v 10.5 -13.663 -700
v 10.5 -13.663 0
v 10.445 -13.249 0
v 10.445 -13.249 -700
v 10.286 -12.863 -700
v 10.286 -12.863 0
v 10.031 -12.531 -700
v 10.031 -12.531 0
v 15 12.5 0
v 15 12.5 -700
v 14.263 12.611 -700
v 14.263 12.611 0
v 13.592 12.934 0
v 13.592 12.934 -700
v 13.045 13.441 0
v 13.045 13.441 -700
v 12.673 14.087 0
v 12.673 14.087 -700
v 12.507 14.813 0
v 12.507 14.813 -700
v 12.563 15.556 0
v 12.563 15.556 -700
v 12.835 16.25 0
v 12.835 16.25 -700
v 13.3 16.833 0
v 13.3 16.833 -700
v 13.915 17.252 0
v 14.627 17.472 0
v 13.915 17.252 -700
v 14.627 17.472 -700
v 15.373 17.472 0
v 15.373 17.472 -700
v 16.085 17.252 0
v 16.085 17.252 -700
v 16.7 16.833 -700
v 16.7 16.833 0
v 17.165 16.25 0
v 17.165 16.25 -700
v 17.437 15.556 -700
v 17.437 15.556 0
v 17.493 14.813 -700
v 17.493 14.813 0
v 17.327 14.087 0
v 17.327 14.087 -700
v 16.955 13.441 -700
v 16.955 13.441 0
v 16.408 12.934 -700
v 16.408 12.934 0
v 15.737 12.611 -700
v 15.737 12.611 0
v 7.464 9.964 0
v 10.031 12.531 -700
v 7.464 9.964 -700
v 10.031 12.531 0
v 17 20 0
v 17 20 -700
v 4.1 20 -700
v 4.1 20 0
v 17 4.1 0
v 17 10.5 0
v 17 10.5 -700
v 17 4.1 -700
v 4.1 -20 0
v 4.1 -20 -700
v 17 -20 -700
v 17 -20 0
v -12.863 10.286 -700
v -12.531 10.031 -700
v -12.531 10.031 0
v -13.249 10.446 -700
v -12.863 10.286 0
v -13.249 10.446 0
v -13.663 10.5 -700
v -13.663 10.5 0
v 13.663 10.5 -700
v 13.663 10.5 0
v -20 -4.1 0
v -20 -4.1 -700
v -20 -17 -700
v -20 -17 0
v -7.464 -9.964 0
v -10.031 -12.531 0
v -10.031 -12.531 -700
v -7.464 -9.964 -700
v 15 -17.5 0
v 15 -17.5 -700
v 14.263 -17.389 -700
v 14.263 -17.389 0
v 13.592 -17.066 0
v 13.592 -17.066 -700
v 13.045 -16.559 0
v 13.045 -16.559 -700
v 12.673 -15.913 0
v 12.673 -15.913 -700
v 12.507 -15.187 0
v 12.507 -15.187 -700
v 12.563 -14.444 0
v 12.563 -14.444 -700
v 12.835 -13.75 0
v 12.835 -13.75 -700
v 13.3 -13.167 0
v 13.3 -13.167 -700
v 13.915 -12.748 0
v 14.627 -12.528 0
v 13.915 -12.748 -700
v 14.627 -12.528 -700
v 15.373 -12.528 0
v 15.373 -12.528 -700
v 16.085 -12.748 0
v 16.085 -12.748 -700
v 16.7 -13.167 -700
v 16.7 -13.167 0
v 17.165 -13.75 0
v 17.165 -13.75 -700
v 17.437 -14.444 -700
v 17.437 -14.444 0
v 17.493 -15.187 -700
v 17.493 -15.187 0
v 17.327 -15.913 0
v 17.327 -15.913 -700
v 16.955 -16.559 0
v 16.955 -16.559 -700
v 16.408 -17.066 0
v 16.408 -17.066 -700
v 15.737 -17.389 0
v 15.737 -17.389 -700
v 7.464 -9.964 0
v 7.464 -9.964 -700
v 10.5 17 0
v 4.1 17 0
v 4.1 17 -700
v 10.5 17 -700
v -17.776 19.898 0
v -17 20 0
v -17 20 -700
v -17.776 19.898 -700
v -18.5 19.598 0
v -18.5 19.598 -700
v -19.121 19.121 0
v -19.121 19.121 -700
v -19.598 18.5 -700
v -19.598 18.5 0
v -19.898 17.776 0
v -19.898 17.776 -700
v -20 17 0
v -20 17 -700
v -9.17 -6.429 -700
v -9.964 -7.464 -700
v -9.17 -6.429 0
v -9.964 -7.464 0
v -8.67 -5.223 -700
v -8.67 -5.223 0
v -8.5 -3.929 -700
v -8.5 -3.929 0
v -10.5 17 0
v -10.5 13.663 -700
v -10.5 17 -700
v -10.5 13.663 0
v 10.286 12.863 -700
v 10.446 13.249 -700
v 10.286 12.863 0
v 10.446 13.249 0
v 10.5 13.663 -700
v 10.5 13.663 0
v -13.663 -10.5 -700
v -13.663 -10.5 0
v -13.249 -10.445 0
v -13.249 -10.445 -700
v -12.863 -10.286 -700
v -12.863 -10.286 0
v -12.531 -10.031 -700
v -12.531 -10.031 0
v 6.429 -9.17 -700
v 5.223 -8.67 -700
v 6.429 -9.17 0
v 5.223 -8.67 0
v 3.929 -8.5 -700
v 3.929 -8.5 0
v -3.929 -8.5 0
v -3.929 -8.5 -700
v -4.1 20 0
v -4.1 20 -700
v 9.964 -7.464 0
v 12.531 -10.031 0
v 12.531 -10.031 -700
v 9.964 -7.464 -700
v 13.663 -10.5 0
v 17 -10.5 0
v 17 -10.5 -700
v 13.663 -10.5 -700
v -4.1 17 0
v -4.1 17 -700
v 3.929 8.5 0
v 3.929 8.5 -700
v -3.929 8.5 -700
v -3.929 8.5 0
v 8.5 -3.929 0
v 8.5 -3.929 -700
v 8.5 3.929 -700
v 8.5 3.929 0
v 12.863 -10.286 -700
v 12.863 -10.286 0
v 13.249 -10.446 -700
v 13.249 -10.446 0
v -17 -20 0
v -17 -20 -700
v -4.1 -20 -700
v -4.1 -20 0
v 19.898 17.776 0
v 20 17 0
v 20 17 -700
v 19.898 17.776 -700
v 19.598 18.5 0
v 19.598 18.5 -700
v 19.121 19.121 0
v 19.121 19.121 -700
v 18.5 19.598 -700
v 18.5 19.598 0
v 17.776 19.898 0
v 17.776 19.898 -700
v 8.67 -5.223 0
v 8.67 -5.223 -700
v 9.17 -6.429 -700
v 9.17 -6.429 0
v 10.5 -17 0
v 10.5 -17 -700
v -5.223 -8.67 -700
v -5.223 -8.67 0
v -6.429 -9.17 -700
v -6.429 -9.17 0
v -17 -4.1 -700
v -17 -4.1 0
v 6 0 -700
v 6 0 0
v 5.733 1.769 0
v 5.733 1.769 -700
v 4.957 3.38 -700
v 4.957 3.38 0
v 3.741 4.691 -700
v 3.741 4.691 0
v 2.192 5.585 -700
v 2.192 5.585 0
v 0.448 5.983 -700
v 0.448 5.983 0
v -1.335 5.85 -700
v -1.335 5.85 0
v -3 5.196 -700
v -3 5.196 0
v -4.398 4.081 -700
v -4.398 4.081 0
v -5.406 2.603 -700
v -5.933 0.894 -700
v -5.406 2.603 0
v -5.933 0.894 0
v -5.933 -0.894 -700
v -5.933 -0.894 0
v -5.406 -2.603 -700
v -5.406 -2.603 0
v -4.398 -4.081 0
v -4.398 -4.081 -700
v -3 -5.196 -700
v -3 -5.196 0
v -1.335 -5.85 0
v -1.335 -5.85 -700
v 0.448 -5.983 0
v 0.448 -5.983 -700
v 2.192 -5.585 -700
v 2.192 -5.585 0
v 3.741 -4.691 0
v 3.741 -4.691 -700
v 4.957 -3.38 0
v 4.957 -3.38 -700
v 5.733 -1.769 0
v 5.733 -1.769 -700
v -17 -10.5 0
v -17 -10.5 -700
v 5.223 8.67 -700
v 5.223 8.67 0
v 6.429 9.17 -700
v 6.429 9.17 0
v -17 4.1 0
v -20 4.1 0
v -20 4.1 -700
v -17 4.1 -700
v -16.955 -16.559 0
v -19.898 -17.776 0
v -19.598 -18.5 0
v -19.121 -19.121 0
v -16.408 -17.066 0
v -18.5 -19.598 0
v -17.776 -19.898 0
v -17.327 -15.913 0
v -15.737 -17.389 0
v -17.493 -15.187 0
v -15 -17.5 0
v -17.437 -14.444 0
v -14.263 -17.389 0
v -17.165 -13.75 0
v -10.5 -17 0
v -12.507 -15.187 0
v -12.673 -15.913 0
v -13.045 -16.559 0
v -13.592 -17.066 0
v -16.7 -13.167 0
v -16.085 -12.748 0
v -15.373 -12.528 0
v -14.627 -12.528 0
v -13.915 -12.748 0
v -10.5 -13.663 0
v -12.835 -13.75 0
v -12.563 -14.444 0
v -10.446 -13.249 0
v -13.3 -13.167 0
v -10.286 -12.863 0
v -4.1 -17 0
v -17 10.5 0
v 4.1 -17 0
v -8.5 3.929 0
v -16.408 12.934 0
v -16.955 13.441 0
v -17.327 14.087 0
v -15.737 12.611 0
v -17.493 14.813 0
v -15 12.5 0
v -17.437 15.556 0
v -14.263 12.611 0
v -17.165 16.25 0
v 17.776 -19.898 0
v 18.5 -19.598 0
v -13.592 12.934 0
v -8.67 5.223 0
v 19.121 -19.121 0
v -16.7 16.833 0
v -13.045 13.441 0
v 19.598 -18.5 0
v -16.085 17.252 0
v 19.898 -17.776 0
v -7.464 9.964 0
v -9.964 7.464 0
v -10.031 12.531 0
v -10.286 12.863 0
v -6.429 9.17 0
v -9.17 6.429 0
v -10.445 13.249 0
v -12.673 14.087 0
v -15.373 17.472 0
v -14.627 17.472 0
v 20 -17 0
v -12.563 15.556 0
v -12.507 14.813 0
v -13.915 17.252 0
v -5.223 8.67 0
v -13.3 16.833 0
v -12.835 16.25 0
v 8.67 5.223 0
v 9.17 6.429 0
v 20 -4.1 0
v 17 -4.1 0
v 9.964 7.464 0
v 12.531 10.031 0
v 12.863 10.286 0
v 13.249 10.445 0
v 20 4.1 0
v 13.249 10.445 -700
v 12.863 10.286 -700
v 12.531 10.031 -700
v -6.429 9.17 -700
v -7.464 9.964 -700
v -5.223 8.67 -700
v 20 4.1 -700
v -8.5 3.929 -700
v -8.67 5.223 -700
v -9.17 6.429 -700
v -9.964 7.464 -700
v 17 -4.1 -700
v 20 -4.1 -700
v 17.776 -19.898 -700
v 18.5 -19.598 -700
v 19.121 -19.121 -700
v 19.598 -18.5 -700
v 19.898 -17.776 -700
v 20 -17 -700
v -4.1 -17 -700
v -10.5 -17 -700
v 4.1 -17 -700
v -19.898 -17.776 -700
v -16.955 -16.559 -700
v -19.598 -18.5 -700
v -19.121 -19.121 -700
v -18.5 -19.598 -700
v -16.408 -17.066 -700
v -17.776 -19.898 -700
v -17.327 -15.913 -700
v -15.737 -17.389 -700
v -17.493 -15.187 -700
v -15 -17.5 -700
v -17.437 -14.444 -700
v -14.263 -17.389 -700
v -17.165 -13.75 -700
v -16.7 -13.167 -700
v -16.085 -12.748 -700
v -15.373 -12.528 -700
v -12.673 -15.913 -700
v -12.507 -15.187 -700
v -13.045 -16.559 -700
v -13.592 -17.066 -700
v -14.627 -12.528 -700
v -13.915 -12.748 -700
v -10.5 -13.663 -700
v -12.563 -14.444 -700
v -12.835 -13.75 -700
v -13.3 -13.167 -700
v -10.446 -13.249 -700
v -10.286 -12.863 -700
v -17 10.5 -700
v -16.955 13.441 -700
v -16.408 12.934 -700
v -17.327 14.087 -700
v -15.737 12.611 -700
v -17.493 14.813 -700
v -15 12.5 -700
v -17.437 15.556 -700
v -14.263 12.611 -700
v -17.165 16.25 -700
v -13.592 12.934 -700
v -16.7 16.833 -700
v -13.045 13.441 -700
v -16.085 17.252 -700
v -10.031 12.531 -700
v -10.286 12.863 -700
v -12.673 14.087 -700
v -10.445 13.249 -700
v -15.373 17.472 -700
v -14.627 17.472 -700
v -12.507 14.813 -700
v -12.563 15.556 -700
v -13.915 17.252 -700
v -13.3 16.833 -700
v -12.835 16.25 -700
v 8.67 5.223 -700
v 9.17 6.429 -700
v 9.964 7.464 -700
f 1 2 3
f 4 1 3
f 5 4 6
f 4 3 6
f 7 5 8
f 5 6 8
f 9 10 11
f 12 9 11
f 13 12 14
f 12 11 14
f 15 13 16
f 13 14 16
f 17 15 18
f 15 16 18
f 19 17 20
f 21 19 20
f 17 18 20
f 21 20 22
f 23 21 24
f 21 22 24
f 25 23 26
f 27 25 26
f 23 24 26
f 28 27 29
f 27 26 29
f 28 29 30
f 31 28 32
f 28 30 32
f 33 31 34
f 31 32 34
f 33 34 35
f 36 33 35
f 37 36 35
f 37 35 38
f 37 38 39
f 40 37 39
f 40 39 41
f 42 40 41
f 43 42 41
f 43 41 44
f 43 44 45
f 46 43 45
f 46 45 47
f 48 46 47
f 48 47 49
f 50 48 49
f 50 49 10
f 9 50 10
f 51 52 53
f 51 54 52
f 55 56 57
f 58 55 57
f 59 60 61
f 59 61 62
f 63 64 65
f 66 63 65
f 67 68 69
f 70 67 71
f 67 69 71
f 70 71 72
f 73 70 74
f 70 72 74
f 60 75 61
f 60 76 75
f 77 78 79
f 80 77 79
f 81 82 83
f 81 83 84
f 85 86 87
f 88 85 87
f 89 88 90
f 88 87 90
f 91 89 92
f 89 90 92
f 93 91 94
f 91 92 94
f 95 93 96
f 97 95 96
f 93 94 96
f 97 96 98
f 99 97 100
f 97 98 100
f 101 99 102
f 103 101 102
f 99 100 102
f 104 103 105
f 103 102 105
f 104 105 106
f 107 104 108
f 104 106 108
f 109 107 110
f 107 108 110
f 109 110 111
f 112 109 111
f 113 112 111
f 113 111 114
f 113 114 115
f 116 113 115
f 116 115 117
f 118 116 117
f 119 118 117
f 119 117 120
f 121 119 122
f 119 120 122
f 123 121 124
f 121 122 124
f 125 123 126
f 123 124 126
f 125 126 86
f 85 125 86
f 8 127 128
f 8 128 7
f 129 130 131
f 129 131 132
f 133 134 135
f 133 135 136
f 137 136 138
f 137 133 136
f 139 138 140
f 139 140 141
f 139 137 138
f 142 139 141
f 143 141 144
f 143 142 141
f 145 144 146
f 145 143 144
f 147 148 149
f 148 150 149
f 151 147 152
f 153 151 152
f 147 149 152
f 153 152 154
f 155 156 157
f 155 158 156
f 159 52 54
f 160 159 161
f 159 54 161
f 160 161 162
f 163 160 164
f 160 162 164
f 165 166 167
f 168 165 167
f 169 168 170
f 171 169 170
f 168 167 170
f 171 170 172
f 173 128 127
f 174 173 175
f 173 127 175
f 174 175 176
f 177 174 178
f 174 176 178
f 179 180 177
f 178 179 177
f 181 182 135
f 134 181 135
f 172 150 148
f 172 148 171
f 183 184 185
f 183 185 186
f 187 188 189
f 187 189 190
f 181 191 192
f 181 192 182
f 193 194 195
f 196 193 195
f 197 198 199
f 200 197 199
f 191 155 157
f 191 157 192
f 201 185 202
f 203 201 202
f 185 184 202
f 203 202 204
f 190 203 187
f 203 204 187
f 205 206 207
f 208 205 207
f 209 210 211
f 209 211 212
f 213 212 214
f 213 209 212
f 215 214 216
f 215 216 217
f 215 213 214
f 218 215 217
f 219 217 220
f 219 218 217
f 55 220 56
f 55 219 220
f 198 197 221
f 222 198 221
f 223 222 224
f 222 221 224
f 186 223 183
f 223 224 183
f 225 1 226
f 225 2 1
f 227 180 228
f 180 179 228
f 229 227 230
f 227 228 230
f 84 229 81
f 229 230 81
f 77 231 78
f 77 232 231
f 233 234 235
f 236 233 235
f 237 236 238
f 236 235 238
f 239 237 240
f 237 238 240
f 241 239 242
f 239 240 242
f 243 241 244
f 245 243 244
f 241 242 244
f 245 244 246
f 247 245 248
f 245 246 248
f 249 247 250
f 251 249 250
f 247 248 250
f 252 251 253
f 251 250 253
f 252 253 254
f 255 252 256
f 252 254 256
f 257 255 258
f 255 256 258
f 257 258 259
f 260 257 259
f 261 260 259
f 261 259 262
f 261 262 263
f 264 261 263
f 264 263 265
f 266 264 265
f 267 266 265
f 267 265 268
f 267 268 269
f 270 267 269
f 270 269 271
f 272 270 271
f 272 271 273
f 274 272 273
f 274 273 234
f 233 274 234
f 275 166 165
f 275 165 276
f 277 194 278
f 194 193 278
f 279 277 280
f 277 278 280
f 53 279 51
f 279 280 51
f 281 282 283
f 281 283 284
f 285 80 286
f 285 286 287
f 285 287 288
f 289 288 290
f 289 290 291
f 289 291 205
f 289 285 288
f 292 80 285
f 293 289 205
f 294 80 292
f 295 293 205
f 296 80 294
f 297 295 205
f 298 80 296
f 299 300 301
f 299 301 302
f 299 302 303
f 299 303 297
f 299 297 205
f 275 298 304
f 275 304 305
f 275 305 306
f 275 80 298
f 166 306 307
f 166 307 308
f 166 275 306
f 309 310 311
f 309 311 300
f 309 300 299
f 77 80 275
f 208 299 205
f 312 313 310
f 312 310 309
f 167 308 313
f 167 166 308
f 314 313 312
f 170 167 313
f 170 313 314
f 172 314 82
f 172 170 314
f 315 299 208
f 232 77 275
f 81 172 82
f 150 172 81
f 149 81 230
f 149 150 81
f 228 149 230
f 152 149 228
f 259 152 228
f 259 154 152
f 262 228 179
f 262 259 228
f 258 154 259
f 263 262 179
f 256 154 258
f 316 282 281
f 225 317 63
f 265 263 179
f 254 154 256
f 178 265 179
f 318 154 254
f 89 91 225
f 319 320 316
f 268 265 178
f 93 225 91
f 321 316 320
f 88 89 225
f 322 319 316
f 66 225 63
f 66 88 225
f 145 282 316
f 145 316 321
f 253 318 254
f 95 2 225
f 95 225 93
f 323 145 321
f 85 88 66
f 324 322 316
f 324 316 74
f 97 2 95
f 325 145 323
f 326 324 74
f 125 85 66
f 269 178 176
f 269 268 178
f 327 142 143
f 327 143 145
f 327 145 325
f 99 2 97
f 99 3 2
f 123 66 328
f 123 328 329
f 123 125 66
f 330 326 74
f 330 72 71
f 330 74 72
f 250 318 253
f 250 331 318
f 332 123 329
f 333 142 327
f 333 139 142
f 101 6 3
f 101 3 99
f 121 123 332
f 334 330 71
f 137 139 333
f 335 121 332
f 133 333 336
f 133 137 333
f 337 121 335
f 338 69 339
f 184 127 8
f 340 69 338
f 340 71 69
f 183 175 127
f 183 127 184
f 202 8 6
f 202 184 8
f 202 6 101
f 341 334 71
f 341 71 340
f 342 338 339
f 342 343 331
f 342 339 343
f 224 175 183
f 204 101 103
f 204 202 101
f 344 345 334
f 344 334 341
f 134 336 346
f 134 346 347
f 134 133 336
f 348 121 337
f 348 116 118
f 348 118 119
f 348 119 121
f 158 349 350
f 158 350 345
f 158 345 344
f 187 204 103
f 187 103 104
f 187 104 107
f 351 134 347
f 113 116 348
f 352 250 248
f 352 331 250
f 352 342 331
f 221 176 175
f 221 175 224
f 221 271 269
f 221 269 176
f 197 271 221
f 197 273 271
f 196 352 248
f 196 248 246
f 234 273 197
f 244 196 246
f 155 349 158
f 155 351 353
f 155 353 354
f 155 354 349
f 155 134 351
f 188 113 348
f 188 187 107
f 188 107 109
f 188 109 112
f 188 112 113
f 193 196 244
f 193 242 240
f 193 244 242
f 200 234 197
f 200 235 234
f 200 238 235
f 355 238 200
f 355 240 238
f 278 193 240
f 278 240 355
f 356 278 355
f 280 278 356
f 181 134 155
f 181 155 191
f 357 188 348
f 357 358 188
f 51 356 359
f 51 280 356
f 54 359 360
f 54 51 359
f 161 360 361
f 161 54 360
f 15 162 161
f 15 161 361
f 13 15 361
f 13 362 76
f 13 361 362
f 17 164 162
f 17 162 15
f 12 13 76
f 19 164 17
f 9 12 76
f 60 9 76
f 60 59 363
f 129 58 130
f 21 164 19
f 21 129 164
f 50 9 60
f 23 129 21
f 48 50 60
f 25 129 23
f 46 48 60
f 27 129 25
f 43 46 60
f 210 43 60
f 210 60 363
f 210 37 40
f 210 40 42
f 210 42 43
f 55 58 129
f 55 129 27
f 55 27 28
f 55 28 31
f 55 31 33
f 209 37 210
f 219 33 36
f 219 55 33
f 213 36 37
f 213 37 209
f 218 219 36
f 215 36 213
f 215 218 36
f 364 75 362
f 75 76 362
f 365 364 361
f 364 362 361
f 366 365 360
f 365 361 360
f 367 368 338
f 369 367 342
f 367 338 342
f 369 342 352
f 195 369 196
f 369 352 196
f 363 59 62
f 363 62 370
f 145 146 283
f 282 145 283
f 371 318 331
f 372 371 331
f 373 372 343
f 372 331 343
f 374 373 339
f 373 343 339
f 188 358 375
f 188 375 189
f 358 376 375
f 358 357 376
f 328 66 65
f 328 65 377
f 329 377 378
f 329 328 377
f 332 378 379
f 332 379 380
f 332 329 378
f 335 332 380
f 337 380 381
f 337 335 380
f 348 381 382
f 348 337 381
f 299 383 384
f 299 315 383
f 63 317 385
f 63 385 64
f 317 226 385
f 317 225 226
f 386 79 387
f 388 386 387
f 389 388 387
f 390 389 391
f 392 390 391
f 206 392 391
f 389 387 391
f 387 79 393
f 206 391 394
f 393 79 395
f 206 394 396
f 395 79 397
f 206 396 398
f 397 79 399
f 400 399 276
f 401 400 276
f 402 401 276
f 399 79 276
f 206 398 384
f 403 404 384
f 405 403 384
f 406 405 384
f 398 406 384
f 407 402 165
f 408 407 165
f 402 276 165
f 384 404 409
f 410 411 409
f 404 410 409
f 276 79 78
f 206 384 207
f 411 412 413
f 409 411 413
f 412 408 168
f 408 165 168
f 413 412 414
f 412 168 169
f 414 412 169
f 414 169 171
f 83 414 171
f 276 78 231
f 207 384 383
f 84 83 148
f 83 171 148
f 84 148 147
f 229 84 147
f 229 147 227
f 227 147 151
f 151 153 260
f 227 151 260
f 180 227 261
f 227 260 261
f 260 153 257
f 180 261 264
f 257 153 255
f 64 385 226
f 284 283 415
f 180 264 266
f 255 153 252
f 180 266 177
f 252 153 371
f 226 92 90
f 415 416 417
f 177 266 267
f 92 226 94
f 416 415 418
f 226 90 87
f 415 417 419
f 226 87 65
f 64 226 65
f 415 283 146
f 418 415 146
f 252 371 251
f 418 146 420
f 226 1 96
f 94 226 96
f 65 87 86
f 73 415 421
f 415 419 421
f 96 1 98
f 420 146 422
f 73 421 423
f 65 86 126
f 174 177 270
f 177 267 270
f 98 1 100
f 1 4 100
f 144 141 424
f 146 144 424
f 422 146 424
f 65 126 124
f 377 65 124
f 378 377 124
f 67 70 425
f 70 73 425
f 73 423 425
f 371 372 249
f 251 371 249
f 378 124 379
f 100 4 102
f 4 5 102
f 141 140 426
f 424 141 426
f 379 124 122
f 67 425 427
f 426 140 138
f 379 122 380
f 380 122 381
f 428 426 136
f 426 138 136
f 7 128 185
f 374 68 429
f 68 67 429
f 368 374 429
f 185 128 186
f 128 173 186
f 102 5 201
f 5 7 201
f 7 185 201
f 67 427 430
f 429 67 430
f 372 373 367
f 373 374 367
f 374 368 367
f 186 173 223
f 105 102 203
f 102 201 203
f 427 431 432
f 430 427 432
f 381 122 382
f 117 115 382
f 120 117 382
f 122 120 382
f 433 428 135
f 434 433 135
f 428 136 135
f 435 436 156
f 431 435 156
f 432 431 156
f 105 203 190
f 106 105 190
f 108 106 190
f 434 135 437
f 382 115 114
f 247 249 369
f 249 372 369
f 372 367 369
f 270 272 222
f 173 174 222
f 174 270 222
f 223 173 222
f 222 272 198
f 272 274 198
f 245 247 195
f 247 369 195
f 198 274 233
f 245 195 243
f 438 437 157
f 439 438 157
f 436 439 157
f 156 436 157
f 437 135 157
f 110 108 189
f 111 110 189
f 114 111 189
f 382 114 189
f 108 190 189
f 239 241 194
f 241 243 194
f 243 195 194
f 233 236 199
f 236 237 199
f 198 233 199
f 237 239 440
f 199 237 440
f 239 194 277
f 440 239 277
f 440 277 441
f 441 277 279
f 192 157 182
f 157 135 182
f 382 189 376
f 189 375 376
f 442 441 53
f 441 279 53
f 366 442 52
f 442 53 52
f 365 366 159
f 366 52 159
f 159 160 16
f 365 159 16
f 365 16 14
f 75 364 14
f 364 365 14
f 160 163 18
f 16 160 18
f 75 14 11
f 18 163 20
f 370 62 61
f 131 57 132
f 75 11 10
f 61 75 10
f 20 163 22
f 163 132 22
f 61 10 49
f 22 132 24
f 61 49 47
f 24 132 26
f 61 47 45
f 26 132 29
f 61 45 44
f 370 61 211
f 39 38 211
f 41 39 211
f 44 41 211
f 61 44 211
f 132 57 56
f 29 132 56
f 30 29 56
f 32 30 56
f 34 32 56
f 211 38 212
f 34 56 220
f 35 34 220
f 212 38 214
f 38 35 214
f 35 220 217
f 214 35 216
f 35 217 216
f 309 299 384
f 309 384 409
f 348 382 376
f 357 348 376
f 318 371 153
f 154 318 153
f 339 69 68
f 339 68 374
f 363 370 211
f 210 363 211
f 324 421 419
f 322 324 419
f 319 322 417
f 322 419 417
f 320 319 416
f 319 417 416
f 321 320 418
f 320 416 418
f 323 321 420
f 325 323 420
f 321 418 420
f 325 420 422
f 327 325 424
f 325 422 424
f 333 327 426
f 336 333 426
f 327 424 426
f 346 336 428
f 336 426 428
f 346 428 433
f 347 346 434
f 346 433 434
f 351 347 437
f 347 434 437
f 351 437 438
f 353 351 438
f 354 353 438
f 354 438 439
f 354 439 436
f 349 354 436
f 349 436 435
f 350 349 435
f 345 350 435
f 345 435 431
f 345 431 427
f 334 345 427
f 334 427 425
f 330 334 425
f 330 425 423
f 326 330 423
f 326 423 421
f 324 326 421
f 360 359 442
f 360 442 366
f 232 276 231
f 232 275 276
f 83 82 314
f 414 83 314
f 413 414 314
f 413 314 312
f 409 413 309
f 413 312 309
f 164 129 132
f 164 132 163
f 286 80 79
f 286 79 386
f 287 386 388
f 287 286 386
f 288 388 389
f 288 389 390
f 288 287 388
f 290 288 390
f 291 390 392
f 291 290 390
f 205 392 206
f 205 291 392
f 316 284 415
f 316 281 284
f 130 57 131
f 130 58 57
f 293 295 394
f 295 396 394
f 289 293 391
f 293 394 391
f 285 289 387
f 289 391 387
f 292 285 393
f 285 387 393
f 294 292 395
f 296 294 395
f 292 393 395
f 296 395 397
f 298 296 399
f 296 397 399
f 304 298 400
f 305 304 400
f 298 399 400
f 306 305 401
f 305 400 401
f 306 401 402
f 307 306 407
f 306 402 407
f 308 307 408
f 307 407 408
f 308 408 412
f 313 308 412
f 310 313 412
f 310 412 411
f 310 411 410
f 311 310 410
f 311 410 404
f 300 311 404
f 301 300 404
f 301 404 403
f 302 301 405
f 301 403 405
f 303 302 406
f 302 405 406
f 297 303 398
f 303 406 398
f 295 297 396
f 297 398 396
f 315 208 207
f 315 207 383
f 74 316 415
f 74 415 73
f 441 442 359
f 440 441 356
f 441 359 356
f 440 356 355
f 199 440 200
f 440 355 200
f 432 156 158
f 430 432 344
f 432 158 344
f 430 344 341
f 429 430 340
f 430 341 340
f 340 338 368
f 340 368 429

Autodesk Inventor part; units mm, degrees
sketch "Skizze_1" plane through (0, 0, 0) normal (0, 0, 1) x (1, 0, 0)
  arc A0 (-20, -17) -> (-17, -20) centre (-17, -17) ccw
  line L0 (-17, -20) -> (-4.1, -20)
  line L1 (-4.1, -20) -> (-4.1, -17)
  line L2 (-4.1, -17) -> (-10.5, -17)
  line L3 (-10.5, -17) -> (-10.5, -13.6627)
  arc A1 (-10.0314, -12.5314) -> (-10.5, -13.6627) centre (-8.9002, -13.6627) ccw
  line L4 (-10.0314, -12.5314) -> (-7.4645, -9.9645)
  arc A2 (-3.9289, -8.5) -> (-7.4645, -9.9645) centre (-3.9289, -13.5) ccw
  line L5 (-3.9289, -8.5) -> (3.9289, -8.5)
  arc A3 (7.4645, -9.9645) -> (3.9289, -8.5) centre (3.9289, -13.5) ccw
  line L6 (7.4645, -9.9645) -> (10.0314, -12.5314)
  arc A4 (10.5, -13.6627) -> (10.0314, -12.5314) centre (8.9002, -13.6627) ccw
  line L7 (10.5, -13.6627) -> (10.5, -17)
  line L8 (10.5, -17) -> (4.1, -17)
  line L9 (4.1, -17) -> (4.1, -20)
  line L10 (4.1, -20) -> (17, -20)
  arc A5 (17, -20) -> (20, -17) centre (17, -17) ccw
  line L11 (20, -17) -> (20, -4.1)
  line L12 (20, -4.1) -> (17, -4.1)
  line L13 (17, -4.1) -> (17, -10.5)
  line L14 (17, -10.5) -> (13.6627, -10.5)
  arc A6 (12.5314, -10.0314) -> (13.6627, -10.5) centre (13.6627, -8.9002) ccw
  line L15 (12.5314, -10.0314) -> (9.9645, -7.4645)
  arc A7 (8.5, -3.9289) -> (9.9645, -7.4645) centre (13.5, -3.9289) ccw
  line L16 (8.5, -3.9289) -> (8.5, 3.9289)
  arc A8 (9.9645, 7.4645) -> (8.5, 3.9289) centre (13.5, 3.9289) ccw
  line L17 (9.9645, 7.4645) -> (12.5314, 10.0314)
  arc A9 (13.6627, 10.5) -> (12.5314, 10.0314) centre (13.6627, 8.9002) ccw
  line L18 (13.6627, 10.5) -> (17, 10.5)
  line L19 (17, 10.5) -> (17, 4.1)
  line L20 (17, 4.1) -> (20, 4.1)
  line L21 (20, 4.1) -> (20, 17)
  arc A10 (20, 17) -> (17, 20) centre (17, 17) ccw
  line L22 (17, 20) -> (4.1, 20)
  line L23 (4.1, 20) -> (4.1, 17)
  line L24 (4.1, 17) -> (10.5, 17)
  line L25 (10.5, 17) -> (10.5, 13.6627)
  arc A11 (10.0314, 12.5314) -> (10.5, 13.6627) centre (8.9002, 13.6627) ccw
  line L26 (10.0314, 12.5314) -> (7.4645, 9.9645)
  arc A12 (3.9289, 8.5) -> (7.4645, 9.9645) centre (3.9289, 13.5) ccw
  line L27 (3.9289, 8.5) -> (-3.9289, 8.5)
  arc A13 (-7.4645, 9.9645) -> (-3.9289, 8.5) centre (-3.9289, 13.5) ccw
  line L28 (-7.4645, 9.9645) -> (-10.0314, 12.5314)
  arc A14 (-10.5, 13.6627) -> (-10.0314, 12.5314) centre (-8.9002, 13.6627) ccw
  line L29 (-10.5, 13.6627) -> (-10.5, 17)
  line L30 (-10.5, 17) -> (-4.1, 17)
  line L31 (-4.1, 17) -> (-4.1, 20)
  line L32 (-4.1, 20) -> (-17, 20)
  arc A15 (-17, 20) -> (-20, 17) centre (-17, 17) ccw
  line L33 (-20, 17) -> (-20, 4.1)
  line L34 (-20, 4.1) -> (-17, 4.1)
  line L35 (-17, 4.1) -> (-17, 10.5)
  line L36 (-17, 10.5) -> (-13.6627, 10.5)
  arc A16 (-12.5314, 10.0314) -> (-13.6627, 10.5) centre (-13.6627, 8.9002) ccw
  line L37 (-12.5314, 10.0314) -> (-9.9645, 7.4645)
  arc A17 (-8.5, 3.9289) -> (-9.9645, 7.4645) centre (-13.5, 3.9289) ccw
  line L38 (-8.5, 3.9289) -> (-8.5, -3.9289)
  arc A18 (-9.9645, -7.4645) -> (-8.5, -3.9289) centre (-13.5, -3.9289) ccw
  line L39 (-9.9645, -7.4645) -> (-12.5314, -10.0314)
  arc A19 (-13.6627, -10.5) -> (-12.5314, -10.0314) centre (-13.6627, -8.9002) ccw
  line L40 (-13.6627, -10.5) -> (-17, -10.5)
  line L41 (-17, -10.5) -> (-17, -4.1)
  line L42 (-17, -4.1) -> (-20, -4.1)
  line L43 (-20, -4.1) -> (-20, -17)
  circle A20 centre (0, 0) radius 6
extrude "Extrusion1" add sketch "Skizze_1" against normal blind 700
sketch "Sketch2" plane through (0, 0, 0) normal (0, 0, 1) x (1, 0, 0)
  point P0 (-15, -15)
hole "Drilling 1" at (-15, -15, 0) direction (0, 0, -1) diameter 5 depth 6000
sketch "Sketch3" plane through (0, 0, 0) normal (0, 0, 1) x (1, 0, 0)
  point P0 (15, -15)
hole "Drilling 2" at (15, -15, 0) direction (0, 0, -1) diameter 5 depth 6000
sketch "Sketch4" plane through (0, 0, 0) normal (0, 0, 1) x (1, 0, 0)
  point P0 (15, 15)
hole "Drilling 3" at (15, 15, 0) direction (0, 0, -1) diameter 5 depth 6000
sketch "Sketch5" plane through (0, 0, 0) normal (0, 0, 1) x (1, 0, 0)
  point P0 (-15, 15)
hole "Drilling 4" at (-15, 15, 0) direction (0, 0, -1) diameter 5 depth 6000
ref_plane "side_4d_XY" through (-20, 0, -350) normal (-1, 0, 0) x (0, 1, 0)
ref_plane "side_4d_YZ" through (-20, 0, -350) normal (0, 1, 0) x (0, 0, -1)
ref_plane "side_4d_ZX" through (-20, 0, -350) normal (0, 0, -1) x (-1, 0, 0)
ref_plane "side_1a_XY" through (0, 20, -350) normal (0, 1, 0) x (1, 0, 0)
ref_plane "side_1a_YZ" through (0, 20, -350) normal (1, 0, 0) x (0, 0, -1)
ref_plane "side_1a_ZX" through (0, 20, -350) normal (0, 0, -1) x (0, 1, 0)
ref_plane "side_2b_XY" through (20, 0, -350) normal (1, 0, 0) x (0, -1, 0)
ref_plane "side_2b_YZ" through (20, 0, -350) normal (0, -1, 0) x (0, 0, -1)
ref_plane "side_2b_ZX" through (20, 0, -350) normal (0, 0, -1) x (1, 0, 0)
ref_plane "side_3c_XY" through (0, -20, -350) normal (0, -1, 0) x (-1, 0, 0)
ref_plane "side_3c_YZ" through (0, -20, -350) normal (-1, 0, 0) x (0, 0, -1)
ref_plane "side_3c_ZX" through (0, -20, -350) normal (0, 0, -1) x (0, -1, 0)
ref_plane "end_XY" through (0, 0, -700) normal (0, 0, -1) x (1, 0, 0)
ref_plane "end_YZ" through (0, 0, -700) normal (1, 0, 0) x (0, -1, 0)
ref_plane "end_ZX" through (0, 0, -700) normal (0, -1, 0) x (0, 0, -1)
ref_plane "start_XY" through (0, 0, 0) normal (0, 0, 1) x (1, 0, 0)
ref_plane "start_YZ" through (0, 0, 0) normal (1, 0, 0) x (0, 1, 0)
ref_plane "start_ZX" through (0, 0, 0) normal (0, 1, 0) x (0, 0, 1)
properties part number "MayTec 1.11.040040.43S_Profile 40x40, 4E, S_700_Detail_(0;0,0,0)"
